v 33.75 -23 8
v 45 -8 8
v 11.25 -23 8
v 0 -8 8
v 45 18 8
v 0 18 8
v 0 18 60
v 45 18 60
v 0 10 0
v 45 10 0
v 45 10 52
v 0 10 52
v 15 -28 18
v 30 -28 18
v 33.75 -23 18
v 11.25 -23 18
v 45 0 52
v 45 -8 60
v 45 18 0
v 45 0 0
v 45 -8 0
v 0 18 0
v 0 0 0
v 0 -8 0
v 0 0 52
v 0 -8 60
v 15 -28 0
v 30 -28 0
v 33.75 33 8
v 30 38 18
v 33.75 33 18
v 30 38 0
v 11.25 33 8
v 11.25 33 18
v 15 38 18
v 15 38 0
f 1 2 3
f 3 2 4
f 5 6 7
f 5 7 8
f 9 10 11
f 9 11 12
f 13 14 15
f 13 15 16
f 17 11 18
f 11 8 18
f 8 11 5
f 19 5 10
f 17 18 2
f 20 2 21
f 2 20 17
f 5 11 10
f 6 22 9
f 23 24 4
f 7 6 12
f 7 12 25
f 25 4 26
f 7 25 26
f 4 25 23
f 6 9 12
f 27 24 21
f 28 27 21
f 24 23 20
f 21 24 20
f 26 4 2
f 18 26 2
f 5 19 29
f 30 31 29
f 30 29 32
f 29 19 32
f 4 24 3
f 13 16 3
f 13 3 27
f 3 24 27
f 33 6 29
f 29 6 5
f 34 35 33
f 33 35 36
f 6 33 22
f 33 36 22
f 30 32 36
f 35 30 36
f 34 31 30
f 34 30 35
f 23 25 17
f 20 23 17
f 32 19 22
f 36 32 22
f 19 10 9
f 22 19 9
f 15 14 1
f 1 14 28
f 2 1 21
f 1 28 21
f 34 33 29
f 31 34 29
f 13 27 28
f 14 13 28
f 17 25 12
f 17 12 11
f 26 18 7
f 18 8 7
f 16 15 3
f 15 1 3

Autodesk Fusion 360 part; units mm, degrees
sketch "Sketch1" plane through (0, 0, 0) normal (0, 1, 0) x (1, 0, 0)
  line L0 (0, 0) -> (45, 0)
  line L1 (45, 0) -> (45, -60)
  line L2 (45, -60) -> (0, -60)
  line L3 (0, -60) -> (0, 0)
  dimension "d9" = 45
  dimension "d10" = 60
extrude "Extrude1" add sketch "Sketch1" against normal blind 8
sketch "Sketch3" plane through (0, 0, 0) normal (0, 1, 0) x (-1, 0, 0)
  line L0 (0, 60) -> (-45, 60)
  line L1 (-45, 60) -> (-45, 0)
  line L2 (-45, 0) -> (0, 0)
  line L3 (0, 0) -> (0, 60)
  line L4 (-45, 60) -> (0, 60)
  line L5 (0, 60) -> (0, 52)
  line L6 (0, 52) -> (-45, 52)
  line L7 (-45, 52) -> (-45, 60)
  dimension "d13" = 45
  dimension "d14" = 8
extrude "Extrude2" add sketch "Sketch3" along normal blind 18 contours L0 L1 L3 L4 L5 L6 L7
sketch "Sketch4" plane through (0, 0, 52) normal (0, 0, -1) x (1, 0, 0)
  line L0 (45, 0) -> (0, 0)
  line L1 (0, 0) -> (0, -18)
  line L2 (0, -18) -> (45, -18)
  line L3 (45, -18) -> (45, 0)
  line L4 (0, -18) -> (45, -18)
  line L5 (45, -18) -> (45, -10)
  line L6 (45, -10) -> (0, -10)
  line L7 (0, -10) -> (0, -18)
  dimension "d17" = 45
  dimension "d18" = 8
extrude "Extrude3" add sketch "Sketch4" along normal blind 52 contours L1 L2 L3 L4 L5 L6 L7
sketch "Sketch5" plane through (0, -8, 0) normal (0, -1, 0) x (1, 0, 0)
  line L0 (45, 60) -> (0, 60)
  line L1 (0, 60) -> (0, 0)
  line L2 (0, 0) -> (45, 0)
  line L3 (45, 0) -> (45, 60)
  line L4 (0, 0) -> (45, 0)
  line L5 (45, 0) -> (45, 8)
  line L6 (45, 8) -> (0, 8)
  line L7 (0, 8) -> (0, 0)
  dimension "d21" = 45
  dimension "d22" = 8
extrude "Extrude4" add sketch "Sketch5" along normal blind 20 contours L1 L2 L3 L4 L5 L6 L7
sketch "Sketch6" plane through (0, 0, 8) normal (0, 0, 1) x (-1, 0, 0)
  line L0 (-45, 8) -> (0, 8)
  line L1 (0, 8) -> (0, 28)
  line L2 (0, 28) -> (-45, 28)
  line L3 (-45, 28) -> (-45, 8)
  line L4 (-22.5, 28) -> (-30, 28)
  line L5 (-22.5, 28) -> (-15, 28)
  line L6 (-30, 28) -> (-45, 8)
  line L7 (-15, 28) -> (0, 8)
  dimension "d25" = 7.5
  dimension "d26" = 7.5
extrude "Extrude5" cut sketch "Sketch6" against normal blind 8 contours L2 L3 L6 | L1 L2 L7
sketch "Sketch7" plane through (0, 0, 8) normal (0, 0, 1) x (-1, 0, 0)
  line L0 (0, 8) -> (-15, 28)
  line L1 (-15, 28) -> (-30, 28)
  line L2 (-30, 28) -> (-45, 8)
  line L3 (-45, 8) -> (0, 8)
  line L4 (-15, 28) -> (-30, 28)
  line L5 (-30, 28) -> (-33.75, 23)
  line L6 (-33.75, 23) -> (-11.25, 23)
  line L7 (-11.25, 23) -> (-15, 28)
  dimension "d29" = 15
  dimension "d30" = 5
extrude "Extrude6" add sketch "Sketch7" along normal blind 10 contours L0 L1 L2 L4 L5 L6 L7
sketch "Sketch8" plane through (0, 18, 0) normal (0, 1, 0) x (-1, 0, 0)
  line L0 (0, 0) -> (0, 60)
  line L1 (0, 60) -> (-45, 60)
  line L2 (-45, 60) -> (-45, 0)
  line L3 (-45, 0) -> (0, 0)
  line L4 (-45, 0) -> (0, 0)
  line L5 (0, 0) -> (0, 8)
  line L6 (0, 8) -> (-45, 8)
  line L7 (-45, 8) -> (-45, 0)
  dimension "d33" = 45
  dimension "d34" = 8
extrude "Extrude7" add sketch "Sketch8" along normal blind 20 contours L0 L2 L3 L4 L5 L6 L7
sketch "Sketch9" plane through (0, 0, 8) normal (0, 0, 1) x (-1, 0, 0)
  line L0 (0, -18) -> (-45, -18)
  line L1 (-45, -18) -> (-45, -38)
  line L2 (-45, -38) -> (0, -38)
  line L3 (0, -38) -> (0, -18)
  line L4 (-22.5, -38) -> (-30, -38)
  line L5 (-22.5, -38) -> (-15, -38)
  line L6 (-15, -38) -> (0, -18)
  line L7 (-30, -38) -> (-45, -18)
  dimension "d37" = 7.5
  dimension "d38" = 7.5
extrude "Extrude8" cut sketch "Sketch9" against normal blind 8 contours L2 L3 L6 | L1 L2 L7
sketch "Sketch10" plane through (0, 0, 8) normal (0, 0, 1) x (-1, 0, 0)
  line L0 (-15, -38) -> (0, -18)
  line L1 (0, -18) -> (-45, -18)
  line L2 (-45, -18) -> (-30, -38)
  line L3 (-30, -38) -> (-15, -38)
  line L4 (-15, -38) -> (-11.25, -33)
  line L5 (-15, -38) -> (-30, -38)
  line L6 (-30, -38) -> (-33.75, -33)
  line L7 (-11.25, -33) -> (-33.75, -33)
  dimension "d41" = 5
extrude "Extrude9" add sketch "Sketch10" along normal blind 10 contours L0 L2 L3 L4 L5 L6 L7
equation "haed = 60 mm"
equation "pinni_breidd = 15 mm"
equation "thykkt = 8 mm"
equation "haed_pinni = 10 mm"
equation "flotur = 20 mm"
equation "breidd = 3 * pinni_breidd"
equation "bil = 10 mm"
equation "pinni_lengd = 5 mm"
equation "d9 = breidd"
equation "d10 = haed"
equation "d11 = -thykkt"
equation "d13 = breidd"
equation "d14 = thykkt"
equation "d15 = bil + thykkt"
equation "d17 = breidd"
equation "d18 = thykkt"
equation "d19 = haed - thykkt"
equation "d21 = breidd"
equation "d22 = thykkt"
equation "d23 = flotur"
equation "d25 = pinni_breidd / 2"
equation "d26 = pinni_breidd / 2"
equation "d27 = -thykkt"
equation "d30 = pinni_lengd"
equation "d31 = haed_pinni"
equation "d33 = breidd"
equation "d34 = thykkt"
equation "d35 = flotur"
equation "d37 = pinni_breidd / 2"
equation "d38 = pinni_breidd / 2"
equation "d39 = -thykkt"
equation "d41 = pinni_lengd"
equation "d42 = haed_pinni"
